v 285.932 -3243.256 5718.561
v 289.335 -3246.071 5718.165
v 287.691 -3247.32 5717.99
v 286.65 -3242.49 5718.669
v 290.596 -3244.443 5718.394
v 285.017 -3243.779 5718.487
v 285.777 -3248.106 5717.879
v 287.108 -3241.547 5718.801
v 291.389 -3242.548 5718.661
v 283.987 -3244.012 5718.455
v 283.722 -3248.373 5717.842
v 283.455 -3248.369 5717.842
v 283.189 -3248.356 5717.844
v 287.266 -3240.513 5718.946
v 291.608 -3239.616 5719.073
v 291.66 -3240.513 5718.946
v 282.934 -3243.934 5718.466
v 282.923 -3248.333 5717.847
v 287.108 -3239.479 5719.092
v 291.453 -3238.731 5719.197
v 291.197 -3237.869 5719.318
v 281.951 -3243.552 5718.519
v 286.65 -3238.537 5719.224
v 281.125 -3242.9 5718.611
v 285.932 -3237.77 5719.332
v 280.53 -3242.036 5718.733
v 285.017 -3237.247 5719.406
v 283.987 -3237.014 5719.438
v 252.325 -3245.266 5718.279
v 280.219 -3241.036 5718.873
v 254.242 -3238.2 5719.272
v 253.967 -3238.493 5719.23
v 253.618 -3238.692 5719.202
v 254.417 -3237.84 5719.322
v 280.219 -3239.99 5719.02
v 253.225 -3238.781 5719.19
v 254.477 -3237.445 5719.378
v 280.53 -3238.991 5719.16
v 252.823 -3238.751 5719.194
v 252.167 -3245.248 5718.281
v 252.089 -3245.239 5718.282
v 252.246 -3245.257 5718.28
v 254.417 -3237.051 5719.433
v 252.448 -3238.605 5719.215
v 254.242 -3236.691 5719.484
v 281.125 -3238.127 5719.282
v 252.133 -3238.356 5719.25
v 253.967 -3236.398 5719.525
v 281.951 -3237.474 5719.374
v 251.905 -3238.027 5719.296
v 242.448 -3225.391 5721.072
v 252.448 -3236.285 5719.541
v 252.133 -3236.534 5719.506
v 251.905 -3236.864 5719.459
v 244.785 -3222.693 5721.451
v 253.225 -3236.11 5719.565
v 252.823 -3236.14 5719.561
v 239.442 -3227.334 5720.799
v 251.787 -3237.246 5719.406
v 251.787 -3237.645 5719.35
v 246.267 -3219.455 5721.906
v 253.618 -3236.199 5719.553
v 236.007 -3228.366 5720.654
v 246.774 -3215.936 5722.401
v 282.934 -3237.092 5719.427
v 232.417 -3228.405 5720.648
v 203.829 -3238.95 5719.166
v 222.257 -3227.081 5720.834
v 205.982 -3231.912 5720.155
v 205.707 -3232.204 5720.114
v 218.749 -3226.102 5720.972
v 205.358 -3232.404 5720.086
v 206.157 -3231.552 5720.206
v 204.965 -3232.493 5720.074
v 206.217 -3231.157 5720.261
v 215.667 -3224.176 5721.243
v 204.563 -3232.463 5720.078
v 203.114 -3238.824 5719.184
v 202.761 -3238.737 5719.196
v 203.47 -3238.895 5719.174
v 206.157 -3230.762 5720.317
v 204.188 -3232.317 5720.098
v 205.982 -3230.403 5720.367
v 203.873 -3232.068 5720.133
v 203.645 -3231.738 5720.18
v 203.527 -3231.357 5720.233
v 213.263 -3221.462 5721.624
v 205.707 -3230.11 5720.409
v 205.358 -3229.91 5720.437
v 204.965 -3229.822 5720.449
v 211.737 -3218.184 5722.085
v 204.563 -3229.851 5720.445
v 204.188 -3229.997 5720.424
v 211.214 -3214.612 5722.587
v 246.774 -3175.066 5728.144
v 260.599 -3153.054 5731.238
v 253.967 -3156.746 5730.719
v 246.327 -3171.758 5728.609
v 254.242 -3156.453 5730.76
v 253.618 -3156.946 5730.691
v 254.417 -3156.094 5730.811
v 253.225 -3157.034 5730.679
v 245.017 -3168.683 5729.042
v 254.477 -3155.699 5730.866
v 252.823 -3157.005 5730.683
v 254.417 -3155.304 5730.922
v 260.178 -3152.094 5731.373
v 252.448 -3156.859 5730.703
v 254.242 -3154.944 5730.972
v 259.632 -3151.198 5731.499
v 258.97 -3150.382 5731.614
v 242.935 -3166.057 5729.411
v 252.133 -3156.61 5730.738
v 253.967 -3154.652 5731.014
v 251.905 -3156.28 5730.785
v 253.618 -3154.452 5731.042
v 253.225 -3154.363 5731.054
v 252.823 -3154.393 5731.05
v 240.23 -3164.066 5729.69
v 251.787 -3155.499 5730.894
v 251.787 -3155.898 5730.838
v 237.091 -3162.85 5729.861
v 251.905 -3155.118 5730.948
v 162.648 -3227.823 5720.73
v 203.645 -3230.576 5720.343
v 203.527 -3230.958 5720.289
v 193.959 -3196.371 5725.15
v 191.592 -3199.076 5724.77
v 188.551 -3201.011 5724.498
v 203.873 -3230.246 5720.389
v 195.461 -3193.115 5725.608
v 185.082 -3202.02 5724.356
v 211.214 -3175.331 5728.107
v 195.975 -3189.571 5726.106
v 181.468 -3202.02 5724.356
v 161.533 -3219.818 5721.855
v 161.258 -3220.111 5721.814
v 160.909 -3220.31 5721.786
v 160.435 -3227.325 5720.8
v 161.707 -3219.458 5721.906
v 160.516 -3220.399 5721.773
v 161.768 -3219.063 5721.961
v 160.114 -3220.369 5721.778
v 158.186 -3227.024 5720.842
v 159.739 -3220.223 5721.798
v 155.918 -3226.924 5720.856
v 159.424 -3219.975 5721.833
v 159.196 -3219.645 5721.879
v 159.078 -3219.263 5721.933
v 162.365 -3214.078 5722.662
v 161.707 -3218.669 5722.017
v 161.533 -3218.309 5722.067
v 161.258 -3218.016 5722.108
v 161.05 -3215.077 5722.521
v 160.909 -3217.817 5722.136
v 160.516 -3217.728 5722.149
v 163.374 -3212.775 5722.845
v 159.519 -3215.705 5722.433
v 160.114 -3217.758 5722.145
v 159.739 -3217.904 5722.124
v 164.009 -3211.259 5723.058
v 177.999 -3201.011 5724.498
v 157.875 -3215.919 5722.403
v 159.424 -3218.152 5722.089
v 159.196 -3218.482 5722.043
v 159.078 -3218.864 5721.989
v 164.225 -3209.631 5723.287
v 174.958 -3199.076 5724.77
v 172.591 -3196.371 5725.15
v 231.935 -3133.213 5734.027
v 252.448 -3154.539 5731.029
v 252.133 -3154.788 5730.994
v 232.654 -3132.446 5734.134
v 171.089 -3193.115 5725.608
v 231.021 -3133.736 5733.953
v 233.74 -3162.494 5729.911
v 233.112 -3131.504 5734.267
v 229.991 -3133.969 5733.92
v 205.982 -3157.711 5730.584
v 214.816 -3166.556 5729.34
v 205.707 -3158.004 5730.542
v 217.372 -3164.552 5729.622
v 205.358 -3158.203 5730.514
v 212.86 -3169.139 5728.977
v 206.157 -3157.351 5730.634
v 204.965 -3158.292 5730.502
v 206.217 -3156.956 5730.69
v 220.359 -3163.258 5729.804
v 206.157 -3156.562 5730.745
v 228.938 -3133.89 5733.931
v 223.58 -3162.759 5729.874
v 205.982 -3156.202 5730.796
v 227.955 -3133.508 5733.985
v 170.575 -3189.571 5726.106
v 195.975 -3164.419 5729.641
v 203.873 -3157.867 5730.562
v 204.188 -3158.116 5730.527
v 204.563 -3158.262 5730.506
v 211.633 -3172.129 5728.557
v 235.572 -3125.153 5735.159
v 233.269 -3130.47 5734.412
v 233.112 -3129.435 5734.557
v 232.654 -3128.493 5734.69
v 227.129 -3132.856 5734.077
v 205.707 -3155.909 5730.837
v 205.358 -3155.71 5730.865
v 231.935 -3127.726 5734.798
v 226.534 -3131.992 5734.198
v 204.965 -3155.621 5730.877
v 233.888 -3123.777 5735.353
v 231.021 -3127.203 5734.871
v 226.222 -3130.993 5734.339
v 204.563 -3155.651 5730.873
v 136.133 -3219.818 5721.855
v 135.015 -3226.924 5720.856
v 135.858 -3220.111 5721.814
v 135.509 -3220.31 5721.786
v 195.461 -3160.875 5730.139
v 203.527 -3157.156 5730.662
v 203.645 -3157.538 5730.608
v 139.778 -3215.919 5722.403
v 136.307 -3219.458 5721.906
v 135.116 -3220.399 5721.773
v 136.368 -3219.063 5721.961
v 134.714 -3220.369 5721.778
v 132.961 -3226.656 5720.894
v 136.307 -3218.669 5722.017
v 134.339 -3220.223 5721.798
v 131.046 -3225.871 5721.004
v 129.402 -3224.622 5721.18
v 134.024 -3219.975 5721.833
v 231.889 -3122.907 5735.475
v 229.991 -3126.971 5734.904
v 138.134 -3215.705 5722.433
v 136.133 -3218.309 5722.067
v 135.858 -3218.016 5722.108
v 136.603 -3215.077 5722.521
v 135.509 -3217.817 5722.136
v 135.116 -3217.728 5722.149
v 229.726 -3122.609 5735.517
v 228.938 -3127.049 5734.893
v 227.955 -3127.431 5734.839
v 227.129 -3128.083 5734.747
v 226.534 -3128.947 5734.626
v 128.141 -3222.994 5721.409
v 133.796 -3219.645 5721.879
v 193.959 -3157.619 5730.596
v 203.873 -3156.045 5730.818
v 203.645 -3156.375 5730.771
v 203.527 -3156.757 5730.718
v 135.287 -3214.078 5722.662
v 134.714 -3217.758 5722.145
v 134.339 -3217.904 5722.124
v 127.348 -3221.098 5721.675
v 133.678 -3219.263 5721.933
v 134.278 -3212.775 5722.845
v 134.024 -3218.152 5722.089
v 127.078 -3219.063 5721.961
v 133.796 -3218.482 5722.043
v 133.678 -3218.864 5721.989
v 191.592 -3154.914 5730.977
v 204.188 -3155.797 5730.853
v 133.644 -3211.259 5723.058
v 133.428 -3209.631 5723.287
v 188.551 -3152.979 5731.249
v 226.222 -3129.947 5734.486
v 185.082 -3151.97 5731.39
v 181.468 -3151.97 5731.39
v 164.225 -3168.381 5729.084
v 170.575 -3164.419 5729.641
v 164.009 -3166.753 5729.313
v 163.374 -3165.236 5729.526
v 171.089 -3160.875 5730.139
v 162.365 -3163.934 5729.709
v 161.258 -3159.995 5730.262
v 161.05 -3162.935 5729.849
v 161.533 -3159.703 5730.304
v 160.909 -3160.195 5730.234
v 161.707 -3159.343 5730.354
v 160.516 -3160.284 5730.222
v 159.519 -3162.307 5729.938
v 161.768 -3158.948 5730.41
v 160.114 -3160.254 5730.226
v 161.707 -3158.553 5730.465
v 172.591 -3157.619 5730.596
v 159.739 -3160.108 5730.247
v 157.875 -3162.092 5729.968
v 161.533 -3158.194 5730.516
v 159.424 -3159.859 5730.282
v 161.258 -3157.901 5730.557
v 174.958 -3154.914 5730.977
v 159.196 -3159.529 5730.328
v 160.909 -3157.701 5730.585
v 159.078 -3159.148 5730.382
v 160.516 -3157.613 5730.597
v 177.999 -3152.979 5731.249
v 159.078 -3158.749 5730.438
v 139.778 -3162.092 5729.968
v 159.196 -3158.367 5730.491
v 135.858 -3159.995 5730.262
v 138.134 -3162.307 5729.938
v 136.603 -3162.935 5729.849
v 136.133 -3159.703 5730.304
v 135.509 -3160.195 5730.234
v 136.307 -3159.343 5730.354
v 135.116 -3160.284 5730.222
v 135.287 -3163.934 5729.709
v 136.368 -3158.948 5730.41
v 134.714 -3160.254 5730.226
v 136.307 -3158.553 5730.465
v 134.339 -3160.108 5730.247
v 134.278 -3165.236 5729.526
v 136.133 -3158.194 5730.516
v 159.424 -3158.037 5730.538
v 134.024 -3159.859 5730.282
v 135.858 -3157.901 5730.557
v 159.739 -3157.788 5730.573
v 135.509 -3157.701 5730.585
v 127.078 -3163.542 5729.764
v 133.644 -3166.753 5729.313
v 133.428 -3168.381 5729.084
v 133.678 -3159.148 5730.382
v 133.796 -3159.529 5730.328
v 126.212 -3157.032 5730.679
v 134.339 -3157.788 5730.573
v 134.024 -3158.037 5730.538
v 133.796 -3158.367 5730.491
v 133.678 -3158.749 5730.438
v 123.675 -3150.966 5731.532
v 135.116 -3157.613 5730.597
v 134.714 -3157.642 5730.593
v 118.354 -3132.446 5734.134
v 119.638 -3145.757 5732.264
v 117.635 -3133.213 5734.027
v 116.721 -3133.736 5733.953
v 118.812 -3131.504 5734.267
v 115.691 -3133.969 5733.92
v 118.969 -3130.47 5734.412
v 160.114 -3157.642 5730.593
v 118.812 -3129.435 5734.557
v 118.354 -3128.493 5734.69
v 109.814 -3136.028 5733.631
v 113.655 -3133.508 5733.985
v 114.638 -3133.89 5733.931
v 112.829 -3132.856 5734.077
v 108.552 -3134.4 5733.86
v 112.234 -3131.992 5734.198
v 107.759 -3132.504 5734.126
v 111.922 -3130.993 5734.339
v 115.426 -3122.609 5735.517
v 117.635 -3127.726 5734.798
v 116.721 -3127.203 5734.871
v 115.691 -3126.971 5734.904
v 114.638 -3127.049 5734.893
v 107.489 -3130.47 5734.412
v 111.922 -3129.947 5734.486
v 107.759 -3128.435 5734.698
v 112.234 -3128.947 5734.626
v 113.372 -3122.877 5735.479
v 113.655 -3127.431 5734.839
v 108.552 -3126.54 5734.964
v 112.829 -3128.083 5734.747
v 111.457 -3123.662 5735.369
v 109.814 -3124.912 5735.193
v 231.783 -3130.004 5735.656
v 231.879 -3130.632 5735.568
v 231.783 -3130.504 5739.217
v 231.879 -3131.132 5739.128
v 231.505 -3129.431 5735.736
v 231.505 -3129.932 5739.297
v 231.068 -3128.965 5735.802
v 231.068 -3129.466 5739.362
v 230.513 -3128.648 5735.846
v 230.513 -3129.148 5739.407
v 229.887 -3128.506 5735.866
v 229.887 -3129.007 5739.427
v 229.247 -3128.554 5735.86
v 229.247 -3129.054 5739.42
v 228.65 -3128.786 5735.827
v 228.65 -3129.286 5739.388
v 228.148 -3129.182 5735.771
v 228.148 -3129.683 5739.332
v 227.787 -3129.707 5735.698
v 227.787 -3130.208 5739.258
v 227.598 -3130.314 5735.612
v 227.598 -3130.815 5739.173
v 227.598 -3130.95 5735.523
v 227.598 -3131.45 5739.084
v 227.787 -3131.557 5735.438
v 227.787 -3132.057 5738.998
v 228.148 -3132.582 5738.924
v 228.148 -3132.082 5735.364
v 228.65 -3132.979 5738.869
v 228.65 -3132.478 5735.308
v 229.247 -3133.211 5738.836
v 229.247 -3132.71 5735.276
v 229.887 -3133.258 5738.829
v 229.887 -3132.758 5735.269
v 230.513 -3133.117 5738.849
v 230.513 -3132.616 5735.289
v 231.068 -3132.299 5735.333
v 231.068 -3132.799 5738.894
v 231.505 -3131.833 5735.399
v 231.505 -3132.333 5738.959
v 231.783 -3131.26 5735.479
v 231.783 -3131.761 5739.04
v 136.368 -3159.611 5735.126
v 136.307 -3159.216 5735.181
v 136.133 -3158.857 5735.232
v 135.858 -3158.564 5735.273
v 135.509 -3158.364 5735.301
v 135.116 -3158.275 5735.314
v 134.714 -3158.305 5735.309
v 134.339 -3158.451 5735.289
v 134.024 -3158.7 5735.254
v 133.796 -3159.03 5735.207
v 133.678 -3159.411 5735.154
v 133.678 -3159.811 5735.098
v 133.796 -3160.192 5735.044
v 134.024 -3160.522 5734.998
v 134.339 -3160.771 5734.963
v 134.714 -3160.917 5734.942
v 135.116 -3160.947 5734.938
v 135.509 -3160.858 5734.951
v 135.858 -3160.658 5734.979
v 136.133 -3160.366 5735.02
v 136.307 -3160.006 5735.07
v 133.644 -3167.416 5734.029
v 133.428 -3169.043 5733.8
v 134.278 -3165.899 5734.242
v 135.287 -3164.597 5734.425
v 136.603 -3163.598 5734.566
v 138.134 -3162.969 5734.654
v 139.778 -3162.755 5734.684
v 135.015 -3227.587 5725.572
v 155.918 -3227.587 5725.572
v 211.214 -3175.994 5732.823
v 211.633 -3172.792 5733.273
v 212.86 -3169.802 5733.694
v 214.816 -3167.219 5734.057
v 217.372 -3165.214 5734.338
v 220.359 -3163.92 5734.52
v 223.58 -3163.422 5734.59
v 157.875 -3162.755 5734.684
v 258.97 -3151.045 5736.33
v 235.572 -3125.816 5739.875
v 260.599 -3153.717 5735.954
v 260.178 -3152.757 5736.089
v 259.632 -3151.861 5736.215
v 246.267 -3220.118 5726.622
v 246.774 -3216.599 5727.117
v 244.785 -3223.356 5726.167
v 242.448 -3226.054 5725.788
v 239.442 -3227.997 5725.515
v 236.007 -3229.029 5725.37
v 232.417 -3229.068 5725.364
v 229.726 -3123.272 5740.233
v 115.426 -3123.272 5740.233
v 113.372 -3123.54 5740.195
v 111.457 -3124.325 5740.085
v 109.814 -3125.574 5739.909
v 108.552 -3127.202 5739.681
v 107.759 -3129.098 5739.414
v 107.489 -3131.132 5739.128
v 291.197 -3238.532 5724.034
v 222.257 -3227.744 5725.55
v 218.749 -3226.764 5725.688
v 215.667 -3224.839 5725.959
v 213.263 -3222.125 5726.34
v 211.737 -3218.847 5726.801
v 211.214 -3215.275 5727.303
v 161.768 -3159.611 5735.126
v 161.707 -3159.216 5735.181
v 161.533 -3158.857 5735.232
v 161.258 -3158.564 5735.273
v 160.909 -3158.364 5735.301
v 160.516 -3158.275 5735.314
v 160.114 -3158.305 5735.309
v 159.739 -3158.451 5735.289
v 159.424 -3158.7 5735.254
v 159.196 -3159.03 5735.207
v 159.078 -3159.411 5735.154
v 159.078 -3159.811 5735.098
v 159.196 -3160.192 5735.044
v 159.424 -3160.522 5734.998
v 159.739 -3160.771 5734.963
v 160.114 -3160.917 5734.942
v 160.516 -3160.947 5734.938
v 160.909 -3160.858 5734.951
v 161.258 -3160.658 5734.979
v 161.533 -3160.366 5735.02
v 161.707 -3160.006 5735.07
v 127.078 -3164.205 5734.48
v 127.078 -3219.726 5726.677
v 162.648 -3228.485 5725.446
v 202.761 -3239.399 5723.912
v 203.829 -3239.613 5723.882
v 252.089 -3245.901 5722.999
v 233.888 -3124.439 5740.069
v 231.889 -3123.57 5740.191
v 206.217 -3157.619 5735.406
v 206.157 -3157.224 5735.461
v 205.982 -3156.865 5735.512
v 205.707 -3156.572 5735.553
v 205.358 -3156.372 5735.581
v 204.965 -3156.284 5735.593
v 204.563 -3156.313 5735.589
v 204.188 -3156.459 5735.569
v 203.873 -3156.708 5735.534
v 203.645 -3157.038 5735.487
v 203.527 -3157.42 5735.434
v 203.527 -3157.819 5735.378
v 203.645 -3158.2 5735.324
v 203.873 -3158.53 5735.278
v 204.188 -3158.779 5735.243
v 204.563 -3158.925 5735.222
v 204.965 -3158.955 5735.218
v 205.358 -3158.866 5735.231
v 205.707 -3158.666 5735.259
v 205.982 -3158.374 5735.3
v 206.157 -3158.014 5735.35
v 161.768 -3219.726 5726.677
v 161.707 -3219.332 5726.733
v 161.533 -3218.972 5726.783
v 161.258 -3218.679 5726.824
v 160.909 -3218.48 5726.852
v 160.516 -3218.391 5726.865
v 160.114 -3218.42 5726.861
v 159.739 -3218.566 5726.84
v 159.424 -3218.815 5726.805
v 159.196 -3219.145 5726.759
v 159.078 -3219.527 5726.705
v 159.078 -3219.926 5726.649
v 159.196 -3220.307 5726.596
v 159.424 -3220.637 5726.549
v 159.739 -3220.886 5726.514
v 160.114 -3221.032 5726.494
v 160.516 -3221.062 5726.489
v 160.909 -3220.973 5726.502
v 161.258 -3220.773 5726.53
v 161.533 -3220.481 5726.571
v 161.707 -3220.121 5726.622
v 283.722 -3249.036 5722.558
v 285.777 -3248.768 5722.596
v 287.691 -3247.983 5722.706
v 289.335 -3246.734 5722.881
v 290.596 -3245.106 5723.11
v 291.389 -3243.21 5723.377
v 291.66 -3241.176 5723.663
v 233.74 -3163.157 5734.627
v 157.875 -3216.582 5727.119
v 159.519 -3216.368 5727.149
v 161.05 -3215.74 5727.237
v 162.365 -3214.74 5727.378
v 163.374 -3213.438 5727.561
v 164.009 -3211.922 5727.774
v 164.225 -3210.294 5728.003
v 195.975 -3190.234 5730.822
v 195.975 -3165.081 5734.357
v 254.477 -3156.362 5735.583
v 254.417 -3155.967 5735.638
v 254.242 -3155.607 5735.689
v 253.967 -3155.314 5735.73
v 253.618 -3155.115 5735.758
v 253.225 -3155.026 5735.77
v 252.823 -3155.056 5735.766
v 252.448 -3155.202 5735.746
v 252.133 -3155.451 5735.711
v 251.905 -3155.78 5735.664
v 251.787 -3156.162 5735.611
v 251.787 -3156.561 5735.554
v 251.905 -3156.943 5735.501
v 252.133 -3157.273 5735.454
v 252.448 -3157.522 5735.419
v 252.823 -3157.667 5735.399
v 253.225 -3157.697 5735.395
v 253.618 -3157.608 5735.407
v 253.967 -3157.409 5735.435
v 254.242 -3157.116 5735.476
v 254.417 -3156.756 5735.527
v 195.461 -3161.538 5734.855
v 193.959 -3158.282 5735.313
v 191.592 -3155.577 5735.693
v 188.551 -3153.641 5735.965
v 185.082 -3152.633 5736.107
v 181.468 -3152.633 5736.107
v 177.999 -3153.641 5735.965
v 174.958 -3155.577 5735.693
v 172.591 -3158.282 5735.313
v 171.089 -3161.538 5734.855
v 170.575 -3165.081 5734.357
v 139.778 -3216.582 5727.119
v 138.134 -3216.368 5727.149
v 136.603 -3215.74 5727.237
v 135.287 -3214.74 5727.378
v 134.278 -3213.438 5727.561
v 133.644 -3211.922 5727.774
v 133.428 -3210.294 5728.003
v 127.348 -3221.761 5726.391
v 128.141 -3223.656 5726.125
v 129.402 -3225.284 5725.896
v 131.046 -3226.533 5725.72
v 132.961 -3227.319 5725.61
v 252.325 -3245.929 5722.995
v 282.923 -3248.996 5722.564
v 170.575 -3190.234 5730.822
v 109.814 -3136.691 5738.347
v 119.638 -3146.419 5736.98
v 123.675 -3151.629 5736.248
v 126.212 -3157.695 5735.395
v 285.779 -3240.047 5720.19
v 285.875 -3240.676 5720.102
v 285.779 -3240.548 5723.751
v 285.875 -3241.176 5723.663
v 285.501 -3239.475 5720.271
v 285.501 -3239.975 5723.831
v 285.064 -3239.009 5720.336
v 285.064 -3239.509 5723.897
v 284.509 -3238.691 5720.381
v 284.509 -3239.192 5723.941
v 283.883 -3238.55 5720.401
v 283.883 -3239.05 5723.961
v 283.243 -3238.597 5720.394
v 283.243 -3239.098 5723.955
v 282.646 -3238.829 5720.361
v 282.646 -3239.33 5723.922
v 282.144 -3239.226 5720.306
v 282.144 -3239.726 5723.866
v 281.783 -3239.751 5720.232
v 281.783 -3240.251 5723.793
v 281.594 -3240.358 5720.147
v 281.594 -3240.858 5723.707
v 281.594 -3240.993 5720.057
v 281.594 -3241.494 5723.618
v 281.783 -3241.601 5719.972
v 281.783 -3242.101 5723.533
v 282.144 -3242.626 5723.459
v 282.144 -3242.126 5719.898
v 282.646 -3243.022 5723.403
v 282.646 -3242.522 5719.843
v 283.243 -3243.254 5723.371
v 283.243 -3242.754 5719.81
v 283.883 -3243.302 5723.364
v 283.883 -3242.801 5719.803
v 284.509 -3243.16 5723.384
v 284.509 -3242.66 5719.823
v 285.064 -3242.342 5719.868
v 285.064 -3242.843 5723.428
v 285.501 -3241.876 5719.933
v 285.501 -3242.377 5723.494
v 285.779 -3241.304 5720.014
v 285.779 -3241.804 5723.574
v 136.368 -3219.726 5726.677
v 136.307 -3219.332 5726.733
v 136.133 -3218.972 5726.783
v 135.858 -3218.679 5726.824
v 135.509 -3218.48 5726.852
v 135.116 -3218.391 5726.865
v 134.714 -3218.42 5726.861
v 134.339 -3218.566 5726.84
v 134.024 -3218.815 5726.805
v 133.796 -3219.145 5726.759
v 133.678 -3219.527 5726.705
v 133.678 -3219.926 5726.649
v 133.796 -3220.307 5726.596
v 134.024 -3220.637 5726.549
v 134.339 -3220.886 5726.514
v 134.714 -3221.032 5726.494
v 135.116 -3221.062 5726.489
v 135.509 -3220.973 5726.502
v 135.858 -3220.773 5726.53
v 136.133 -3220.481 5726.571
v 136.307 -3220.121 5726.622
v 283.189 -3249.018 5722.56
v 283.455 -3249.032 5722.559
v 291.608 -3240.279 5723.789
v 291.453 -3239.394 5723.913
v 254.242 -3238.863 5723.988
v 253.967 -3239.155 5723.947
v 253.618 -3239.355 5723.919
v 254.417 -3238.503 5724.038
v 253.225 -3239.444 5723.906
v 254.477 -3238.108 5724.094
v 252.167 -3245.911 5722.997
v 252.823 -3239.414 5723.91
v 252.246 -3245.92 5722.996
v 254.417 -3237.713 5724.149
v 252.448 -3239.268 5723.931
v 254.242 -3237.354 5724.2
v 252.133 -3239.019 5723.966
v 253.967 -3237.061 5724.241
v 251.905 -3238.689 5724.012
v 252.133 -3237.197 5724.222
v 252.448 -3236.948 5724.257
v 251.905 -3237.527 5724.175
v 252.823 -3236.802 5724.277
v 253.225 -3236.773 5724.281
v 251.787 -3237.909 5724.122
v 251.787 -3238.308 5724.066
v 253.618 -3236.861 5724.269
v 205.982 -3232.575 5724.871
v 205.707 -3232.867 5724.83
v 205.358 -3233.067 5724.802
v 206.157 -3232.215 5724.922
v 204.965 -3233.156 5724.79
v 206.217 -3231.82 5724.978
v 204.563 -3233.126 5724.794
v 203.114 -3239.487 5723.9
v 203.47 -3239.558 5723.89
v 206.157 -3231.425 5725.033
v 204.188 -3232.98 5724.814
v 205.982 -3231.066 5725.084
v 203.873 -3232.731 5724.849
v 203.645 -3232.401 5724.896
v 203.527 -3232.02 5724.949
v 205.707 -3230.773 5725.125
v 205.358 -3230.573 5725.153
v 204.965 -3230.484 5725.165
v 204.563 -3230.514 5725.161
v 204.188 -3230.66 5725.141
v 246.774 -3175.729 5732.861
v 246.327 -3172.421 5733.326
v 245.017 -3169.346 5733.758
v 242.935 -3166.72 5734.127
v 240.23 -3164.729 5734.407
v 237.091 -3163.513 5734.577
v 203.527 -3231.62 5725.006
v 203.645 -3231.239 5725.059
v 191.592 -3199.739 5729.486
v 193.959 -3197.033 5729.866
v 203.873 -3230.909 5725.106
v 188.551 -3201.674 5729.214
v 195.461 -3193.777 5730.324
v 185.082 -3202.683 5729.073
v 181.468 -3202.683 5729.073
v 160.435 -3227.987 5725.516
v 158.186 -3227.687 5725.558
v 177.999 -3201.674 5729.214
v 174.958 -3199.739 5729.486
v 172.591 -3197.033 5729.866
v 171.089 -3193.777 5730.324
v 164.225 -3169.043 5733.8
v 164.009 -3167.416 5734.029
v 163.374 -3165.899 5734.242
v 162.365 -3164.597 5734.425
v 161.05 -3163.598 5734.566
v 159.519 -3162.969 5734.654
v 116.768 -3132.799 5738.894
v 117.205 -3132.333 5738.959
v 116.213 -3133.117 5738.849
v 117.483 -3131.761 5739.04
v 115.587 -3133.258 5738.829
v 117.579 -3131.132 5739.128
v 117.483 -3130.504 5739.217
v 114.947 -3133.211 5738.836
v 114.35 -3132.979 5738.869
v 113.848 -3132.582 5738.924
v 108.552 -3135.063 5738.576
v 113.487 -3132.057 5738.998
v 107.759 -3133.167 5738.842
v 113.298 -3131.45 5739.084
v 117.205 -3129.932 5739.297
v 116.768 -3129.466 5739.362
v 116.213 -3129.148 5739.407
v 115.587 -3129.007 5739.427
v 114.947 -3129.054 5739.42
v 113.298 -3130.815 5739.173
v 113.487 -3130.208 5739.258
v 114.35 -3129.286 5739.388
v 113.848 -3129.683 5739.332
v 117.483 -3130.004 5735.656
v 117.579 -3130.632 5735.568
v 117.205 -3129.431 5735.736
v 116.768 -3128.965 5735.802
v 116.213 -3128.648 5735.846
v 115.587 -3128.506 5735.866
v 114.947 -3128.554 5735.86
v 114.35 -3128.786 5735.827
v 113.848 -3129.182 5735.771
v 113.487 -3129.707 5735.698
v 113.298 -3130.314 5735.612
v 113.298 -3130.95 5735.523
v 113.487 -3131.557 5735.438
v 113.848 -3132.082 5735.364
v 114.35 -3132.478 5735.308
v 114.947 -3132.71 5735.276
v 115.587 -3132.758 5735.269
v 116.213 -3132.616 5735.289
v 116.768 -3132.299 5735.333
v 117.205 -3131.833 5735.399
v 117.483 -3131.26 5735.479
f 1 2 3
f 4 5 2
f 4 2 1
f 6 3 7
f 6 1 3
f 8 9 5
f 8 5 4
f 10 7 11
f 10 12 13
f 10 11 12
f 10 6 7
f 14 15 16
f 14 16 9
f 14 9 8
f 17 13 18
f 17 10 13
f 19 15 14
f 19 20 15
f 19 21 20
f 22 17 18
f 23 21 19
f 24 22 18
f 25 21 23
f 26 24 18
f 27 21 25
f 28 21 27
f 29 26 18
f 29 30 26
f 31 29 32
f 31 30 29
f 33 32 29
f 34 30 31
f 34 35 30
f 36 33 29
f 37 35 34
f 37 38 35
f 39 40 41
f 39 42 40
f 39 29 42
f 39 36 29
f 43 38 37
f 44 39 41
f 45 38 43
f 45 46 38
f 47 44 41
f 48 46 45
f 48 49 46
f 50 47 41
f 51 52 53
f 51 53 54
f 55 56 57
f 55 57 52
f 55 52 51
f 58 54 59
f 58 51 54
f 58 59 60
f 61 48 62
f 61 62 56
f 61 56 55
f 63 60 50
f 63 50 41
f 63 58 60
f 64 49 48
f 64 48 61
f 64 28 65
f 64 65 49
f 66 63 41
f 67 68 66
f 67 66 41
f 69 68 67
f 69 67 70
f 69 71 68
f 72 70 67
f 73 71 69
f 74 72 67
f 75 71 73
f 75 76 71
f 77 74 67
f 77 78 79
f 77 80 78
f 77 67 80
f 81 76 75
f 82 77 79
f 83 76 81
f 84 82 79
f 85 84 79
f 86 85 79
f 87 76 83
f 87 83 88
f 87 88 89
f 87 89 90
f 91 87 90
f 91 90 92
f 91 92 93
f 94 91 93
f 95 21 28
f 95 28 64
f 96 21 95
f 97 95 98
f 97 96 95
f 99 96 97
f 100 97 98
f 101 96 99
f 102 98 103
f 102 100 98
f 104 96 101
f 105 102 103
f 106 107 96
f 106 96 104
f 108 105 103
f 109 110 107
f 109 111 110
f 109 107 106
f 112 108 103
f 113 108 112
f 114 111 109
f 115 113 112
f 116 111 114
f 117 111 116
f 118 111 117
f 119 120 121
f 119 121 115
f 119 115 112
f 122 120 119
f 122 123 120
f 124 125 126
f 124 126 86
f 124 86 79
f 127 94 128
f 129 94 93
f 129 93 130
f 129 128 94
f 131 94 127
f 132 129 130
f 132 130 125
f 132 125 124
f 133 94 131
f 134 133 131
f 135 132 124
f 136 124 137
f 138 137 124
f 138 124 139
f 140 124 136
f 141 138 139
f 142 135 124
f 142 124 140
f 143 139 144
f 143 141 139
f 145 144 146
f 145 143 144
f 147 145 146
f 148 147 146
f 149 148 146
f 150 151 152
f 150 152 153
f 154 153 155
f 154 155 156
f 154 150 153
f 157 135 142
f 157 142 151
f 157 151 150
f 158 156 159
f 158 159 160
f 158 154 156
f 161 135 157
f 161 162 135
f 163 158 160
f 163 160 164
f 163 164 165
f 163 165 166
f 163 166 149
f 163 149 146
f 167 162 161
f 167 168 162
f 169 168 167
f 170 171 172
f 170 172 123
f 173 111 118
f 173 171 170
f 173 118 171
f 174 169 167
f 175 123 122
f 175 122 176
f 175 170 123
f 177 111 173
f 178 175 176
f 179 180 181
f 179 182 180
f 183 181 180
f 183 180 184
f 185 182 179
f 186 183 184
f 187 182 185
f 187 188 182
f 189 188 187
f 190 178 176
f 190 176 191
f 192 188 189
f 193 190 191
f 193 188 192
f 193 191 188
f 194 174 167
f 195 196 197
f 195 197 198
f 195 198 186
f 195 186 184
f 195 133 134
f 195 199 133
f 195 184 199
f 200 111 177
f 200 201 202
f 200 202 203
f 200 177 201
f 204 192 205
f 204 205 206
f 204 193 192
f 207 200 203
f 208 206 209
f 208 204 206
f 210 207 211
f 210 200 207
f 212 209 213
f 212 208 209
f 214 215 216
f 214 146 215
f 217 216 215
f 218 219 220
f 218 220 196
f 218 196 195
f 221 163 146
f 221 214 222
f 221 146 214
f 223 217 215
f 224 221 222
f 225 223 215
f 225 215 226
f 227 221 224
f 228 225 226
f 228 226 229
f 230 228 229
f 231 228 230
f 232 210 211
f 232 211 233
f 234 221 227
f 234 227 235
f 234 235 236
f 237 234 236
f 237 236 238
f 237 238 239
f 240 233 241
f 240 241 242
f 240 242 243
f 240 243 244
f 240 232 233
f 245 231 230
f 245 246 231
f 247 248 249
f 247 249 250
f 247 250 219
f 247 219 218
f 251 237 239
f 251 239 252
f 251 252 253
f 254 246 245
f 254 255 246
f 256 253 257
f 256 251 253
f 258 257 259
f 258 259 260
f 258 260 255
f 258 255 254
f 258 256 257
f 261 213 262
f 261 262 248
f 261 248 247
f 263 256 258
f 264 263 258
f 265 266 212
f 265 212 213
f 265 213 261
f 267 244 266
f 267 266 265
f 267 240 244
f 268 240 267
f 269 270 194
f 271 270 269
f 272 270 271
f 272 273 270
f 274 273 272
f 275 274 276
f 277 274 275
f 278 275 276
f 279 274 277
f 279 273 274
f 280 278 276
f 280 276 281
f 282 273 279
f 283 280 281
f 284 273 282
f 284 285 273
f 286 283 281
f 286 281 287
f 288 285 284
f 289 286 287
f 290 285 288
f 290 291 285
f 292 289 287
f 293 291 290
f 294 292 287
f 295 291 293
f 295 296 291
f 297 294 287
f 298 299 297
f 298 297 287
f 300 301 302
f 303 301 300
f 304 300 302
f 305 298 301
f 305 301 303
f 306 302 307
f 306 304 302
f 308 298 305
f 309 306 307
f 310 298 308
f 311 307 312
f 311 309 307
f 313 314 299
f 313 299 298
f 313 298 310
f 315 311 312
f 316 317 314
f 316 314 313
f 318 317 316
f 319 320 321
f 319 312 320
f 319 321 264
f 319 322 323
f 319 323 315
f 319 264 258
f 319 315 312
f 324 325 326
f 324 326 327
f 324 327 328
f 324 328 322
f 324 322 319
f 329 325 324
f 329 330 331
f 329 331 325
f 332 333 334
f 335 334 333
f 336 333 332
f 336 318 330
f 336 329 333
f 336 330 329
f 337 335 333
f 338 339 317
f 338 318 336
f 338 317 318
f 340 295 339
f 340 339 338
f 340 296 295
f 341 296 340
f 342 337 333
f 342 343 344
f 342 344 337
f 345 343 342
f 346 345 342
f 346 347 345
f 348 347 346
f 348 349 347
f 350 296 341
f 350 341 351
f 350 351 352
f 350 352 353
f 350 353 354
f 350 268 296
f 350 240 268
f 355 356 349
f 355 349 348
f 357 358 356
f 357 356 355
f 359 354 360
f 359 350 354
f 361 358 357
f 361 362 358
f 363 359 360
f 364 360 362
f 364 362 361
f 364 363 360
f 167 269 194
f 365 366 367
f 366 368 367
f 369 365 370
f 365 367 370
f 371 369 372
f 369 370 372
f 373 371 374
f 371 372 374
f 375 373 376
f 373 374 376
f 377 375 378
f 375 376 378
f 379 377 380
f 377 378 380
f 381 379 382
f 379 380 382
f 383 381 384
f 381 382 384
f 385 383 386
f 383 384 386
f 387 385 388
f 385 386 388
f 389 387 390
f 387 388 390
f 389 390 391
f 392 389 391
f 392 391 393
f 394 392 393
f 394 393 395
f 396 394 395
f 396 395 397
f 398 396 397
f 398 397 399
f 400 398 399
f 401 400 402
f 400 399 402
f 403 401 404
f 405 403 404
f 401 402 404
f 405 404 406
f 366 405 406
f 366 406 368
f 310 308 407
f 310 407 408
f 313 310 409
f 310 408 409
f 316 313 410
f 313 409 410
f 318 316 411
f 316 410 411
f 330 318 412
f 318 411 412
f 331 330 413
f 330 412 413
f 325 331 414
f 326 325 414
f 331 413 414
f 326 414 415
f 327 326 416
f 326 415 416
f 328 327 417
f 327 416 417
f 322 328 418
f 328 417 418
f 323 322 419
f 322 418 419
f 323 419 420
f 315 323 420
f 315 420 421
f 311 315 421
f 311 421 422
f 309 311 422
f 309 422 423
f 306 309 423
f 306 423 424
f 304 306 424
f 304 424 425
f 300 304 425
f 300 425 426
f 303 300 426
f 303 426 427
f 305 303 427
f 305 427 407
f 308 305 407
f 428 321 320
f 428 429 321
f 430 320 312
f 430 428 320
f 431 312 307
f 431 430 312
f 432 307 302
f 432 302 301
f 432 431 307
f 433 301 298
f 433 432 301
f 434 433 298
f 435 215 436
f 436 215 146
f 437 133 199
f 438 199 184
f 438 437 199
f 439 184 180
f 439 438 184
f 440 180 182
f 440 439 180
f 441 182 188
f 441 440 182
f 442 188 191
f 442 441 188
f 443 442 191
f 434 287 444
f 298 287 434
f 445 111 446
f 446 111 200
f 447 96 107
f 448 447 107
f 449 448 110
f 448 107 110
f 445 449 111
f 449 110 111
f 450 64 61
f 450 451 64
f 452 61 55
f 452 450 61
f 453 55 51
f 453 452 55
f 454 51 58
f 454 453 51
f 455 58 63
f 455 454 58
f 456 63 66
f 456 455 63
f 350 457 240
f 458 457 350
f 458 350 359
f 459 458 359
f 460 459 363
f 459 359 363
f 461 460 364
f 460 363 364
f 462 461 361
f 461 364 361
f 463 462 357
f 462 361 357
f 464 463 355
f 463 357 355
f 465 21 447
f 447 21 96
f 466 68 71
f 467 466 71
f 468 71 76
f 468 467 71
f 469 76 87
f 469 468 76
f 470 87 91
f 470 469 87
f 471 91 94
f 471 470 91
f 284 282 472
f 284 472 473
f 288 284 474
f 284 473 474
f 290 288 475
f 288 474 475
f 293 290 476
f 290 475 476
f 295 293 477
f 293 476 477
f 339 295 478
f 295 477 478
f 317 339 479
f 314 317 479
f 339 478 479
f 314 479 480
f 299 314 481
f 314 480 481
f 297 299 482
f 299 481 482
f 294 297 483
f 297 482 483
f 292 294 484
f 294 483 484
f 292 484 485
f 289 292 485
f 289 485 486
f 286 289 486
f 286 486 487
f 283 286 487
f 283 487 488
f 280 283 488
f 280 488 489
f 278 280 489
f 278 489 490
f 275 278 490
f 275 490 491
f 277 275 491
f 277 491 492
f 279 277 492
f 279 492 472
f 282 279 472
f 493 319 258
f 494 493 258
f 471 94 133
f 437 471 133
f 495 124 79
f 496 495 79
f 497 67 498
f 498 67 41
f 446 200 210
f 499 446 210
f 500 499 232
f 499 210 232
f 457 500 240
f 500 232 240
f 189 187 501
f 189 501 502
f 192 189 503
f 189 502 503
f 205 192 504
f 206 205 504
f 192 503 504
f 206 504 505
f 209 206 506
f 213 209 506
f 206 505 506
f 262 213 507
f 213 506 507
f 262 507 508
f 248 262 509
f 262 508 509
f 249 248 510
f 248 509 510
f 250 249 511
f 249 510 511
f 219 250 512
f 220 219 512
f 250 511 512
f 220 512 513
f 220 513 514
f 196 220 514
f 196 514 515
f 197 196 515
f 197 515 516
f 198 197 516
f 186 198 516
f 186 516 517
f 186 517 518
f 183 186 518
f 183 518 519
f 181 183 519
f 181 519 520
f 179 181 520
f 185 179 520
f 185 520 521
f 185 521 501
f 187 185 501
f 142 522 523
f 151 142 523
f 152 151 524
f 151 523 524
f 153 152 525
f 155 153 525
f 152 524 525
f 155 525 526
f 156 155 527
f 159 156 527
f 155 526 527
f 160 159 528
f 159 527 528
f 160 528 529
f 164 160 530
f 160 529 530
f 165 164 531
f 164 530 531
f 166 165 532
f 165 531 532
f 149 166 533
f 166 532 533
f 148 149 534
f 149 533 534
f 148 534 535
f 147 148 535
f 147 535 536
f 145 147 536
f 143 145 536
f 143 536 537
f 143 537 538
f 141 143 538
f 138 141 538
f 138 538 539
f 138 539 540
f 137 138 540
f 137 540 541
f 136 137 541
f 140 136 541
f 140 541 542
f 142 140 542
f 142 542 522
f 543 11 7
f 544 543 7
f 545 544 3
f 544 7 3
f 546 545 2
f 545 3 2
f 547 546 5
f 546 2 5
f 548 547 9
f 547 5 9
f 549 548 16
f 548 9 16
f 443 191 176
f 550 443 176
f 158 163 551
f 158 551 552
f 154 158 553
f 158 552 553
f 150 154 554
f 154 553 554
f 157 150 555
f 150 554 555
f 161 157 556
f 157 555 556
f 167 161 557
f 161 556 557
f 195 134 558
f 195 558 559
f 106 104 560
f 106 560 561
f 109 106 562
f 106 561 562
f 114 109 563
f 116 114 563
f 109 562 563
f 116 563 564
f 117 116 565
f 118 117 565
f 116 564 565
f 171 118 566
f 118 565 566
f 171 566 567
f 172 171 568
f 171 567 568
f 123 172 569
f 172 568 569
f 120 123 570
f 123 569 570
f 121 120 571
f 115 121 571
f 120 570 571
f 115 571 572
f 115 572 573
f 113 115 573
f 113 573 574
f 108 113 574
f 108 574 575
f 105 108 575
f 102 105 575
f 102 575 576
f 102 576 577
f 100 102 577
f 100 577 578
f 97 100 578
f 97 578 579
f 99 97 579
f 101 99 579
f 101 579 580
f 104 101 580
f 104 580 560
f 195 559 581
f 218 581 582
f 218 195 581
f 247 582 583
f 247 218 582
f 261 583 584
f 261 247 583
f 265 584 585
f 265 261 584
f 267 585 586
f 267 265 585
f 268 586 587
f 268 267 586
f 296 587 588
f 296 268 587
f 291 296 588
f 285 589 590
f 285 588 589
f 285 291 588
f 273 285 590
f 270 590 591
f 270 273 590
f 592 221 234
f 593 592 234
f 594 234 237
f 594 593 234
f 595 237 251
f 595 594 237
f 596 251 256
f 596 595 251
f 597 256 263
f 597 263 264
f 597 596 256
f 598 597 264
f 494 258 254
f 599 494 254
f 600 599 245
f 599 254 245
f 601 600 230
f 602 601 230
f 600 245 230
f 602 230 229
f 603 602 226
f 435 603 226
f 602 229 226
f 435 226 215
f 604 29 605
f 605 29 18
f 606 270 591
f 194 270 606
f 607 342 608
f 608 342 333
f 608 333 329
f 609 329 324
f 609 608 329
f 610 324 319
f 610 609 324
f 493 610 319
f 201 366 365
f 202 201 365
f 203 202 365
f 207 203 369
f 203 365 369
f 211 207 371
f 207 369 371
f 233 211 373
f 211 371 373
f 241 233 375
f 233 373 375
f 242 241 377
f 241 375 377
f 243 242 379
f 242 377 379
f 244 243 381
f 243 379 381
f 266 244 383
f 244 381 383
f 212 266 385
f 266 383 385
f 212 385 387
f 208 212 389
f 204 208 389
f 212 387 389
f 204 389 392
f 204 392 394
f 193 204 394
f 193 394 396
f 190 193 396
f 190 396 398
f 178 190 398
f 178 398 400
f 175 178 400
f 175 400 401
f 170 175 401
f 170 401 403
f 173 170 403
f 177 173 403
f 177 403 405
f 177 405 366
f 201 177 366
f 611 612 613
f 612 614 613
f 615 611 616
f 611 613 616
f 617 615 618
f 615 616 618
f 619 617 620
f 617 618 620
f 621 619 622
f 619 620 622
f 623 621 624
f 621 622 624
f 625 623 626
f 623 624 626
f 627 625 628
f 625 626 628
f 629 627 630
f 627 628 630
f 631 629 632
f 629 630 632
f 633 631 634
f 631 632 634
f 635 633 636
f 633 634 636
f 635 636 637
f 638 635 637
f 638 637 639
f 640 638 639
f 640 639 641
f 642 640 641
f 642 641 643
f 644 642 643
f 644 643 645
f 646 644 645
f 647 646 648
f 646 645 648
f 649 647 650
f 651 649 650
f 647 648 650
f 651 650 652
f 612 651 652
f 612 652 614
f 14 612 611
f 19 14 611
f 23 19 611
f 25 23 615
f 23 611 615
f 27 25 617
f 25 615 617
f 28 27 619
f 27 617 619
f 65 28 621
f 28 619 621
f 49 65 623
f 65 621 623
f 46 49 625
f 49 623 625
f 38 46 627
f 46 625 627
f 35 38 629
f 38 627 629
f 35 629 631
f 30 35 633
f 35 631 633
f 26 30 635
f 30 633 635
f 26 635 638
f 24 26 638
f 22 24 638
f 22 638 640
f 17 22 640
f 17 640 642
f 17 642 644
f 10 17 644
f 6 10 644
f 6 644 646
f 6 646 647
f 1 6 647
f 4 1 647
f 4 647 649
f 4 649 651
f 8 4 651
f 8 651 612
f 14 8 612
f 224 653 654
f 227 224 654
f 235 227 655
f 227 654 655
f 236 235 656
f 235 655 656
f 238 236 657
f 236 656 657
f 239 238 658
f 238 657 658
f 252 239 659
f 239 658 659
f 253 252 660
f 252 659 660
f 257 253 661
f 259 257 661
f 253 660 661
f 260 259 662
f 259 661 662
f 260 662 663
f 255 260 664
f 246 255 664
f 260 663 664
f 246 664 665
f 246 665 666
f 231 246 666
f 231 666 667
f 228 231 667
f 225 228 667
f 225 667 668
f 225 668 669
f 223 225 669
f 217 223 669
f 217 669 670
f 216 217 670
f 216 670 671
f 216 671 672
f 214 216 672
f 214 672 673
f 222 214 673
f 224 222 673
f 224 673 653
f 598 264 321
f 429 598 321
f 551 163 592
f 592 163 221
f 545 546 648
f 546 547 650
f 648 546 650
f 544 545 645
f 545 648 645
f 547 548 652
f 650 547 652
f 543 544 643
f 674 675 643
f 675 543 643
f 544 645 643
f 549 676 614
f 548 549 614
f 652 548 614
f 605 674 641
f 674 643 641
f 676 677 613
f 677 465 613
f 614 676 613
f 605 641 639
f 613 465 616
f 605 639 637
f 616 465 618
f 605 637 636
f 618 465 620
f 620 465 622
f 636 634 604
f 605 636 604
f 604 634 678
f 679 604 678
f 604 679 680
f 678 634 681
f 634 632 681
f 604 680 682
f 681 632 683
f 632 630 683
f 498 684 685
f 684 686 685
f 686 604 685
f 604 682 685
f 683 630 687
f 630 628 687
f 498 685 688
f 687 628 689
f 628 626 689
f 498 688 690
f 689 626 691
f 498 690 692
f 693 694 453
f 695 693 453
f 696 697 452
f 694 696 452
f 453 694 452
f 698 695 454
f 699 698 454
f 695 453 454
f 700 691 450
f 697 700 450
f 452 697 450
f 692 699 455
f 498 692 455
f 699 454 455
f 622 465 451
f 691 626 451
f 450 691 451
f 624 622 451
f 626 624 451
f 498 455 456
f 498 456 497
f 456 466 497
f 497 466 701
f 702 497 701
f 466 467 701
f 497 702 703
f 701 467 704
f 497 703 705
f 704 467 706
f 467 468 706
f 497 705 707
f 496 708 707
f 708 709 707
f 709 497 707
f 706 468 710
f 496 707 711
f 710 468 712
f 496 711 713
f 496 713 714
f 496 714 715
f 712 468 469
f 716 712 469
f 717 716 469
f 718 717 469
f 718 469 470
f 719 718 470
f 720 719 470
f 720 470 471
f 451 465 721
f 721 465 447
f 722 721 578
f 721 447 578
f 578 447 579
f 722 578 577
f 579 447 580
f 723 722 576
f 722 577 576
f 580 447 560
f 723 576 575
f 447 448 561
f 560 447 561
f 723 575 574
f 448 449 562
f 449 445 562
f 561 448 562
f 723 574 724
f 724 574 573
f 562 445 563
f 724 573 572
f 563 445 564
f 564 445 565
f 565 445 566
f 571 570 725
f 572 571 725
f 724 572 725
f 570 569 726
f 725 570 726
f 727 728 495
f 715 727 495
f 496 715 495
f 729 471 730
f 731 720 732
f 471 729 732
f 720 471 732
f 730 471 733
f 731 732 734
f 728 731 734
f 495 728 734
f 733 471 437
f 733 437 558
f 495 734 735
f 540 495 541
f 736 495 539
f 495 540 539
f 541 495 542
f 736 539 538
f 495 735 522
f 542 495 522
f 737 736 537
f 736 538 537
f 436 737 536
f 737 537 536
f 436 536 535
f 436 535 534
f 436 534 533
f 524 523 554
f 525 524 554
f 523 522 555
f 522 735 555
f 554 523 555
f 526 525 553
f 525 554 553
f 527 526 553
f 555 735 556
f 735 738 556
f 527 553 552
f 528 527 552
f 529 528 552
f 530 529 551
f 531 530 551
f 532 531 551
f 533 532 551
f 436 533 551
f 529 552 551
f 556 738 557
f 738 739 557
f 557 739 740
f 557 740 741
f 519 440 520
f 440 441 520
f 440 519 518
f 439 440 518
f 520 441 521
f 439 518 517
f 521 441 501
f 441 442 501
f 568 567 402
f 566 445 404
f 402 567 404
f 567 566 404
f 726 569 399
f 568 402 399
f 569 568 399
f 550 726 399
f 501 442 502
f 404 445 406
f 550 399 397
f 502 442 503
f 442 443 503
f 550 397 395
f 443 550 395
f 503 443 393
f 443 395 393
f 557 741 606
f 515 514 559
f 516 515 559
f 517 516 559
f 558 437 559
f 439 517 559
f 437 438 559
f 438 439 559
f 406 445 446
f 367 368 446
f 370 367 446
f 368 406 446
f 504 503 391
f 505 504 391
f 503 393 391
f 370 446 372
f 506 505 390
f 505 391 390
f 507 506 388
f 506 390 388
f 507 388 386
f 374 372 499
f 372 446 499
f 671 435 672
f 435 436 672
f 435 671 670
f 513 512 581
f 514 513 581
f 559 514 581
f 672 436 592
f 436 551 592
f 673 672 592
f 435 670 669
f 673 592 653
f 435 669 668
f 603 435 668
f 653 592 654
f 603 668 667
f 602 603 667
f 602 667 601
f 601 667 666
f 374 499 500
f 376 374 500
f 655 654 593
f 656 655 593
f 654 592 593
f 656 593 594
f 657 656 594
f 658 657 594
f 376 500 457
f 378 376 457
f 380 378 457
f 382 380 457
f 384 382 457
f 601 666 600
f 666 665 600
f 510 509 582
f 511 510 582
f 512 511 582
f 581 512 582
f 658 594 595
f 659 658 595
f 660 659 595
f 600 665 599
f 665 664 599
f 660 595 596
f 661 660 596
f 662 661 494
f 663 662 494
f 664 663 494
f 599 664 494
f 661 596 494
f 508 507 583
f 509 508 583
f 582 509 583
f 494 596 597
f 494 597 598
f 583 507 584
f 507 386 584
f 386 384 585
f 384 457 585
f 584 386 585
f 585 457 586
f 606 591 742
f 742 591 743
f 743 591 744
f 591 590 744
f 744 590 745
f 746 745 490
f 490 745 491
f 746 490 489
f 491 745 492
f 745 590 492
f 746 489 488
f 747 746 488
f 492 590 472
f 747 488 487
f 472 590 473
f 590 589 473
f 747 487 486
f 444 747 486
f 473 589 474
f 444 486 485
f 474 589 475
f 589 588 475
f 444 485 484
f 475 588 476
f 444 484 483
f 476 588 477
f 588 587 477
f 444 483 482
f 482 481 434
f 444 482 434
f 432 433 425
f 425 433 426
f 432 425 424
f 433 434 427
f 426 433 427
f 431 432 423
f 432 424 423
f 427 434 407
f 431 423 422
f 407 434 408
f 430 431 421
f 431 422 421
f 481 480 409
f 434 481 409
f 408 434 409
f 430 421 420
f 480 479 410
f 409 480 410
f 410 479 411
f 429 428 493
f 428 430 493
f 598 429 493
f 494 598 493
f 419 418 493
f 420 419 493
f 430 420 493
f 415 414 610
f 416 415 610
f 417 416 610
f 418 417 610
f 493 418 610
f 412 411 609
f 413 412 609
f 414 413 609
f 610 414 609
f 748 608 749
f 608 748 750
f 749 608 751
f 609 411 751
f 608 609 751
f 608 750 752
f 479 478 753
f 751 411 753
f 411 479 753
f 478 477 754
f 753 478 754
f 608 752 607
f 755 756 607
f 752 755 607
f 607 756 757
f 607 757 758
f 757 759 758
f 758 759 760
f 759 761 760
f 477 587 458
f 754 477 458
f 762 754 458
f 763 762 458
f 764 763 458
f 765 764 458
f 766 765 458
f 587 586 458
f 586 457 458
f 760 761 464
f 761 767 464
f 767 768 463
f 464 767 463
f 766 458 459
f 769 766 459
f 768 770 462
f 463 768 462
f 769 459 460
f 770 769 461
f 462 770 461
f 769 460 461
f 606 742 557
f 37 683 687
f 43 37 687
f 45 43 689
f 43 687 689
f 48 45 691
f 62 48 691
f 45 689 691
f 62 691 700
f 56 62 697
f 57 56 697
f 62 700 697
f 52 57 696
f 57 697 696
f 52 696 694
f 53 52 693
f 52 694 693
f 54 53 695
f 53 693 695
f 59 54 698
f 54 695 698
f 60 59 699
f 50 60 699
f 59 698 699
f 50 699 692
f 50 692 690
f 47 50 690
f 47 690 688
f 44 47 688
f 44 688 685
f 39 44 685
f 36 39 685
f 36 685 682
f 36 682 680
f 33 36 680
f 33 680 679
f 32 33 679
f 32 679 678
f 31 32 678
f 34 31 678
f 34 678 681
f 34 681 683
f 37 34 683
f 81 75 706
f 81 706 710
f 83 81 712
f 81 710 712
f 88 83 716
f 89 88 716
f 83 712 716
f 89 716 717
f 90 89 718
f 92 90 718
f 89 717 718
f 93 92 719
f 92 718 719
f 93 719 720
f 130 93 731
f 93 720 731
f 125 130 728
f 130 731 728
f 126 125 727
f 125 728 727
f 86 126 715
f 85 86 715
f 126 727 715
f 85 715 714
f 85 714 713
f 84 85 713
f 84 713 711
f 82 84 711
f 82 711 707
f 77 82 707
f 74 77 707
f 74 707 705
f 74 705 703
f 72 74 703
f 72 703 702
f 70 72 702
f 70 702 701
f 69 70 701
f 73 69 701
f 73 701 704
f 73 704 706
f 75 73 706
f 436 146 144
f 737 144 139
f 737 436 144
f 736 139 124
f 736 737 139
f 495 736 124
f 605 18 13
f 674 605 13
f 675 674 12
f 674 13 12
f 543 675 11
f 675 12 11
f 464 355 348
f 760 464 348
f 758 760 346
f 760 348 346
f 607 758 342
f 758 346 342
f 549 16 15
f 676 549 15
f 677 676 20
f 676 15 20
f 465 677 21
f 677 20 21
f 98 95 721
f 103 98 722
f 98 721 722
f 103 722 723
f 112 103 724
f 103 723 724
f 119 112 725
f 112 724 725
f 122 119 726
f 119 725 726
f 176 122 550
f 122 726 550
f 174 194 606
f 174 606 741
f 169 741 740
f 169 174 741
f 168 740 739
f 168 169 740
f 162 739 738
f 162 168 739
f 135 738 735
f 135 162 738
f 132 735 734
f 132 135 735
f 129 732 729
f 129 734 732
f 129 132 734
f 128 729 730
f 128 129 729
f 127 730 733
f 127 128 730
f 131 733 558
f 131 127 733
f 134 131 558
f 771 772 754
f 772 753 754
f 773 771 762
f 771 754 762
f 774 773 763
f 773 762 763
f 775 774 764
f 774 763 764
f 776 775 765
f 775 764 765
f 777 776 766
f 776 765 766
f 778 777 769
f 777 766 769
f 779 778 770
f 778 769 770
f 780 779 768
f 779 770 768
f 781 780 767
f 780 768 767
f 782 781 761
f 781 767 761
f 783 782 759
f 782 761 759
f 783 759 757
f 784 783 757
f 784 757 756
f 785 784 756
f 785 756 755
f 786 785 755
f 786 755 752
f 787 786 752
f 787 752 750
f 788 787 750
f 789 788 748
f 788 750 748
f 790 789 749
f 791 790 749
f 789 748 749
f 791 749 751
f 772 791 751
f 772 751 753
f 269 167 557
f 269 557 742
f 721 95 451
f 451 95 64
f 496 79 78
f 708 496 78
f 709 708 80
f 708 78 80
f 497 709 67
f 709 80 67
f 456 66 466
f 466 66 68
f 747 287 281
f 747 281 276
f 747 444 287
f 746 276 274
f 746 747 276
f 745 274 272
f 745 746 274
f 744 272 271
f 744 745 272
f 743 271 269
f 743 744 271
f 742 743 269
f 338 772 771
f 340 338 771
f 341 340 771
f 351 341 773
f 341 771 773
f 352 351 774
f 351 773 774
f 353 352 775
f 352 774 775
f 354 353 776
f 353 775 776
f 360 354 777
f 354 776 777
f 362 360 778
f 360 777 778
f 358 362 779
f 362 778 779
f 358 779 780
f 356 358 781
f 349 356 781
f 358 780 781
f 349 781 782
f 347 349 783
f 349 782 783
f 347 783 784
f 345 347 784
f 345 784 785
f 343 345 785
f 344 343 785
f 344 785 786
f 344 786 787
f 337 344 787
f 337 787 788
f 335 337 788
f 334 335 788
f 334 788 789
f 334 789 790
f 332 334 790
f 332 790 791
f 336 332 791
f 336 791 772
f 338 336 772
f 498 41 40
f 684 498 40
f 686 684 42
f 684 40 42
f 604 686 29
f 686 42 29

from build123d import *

# Parameters (mm, degrees)
SKETCH2_W                                         = 184.171135827
SKETCH2_H                                         = 127
BOSS_EXTRUDE1_DEPTH                               = 4.7625
CSK_FOR_6_FLAT_HEAD_MACHINE_SCREW_100_D           = 4.3053
CSK_FOR_6_FLAT_HEAD_MACHINE_SCREW_100_CSINK_D     = 7.0866
CSK_FOR_6_FLAT_HEAD_MACHINE_SCREW_100_CSINK_ANGLE = 100
CUT_EXTRUDE1_DEPTH                                = 2440.147405433
F_2_CLEARANCE_HOLE1_D                             = 2.7051
CUT_EXTRUDE2_DEPTH                                = 4.7625
FILLET1_R                                         = 25.4
SKETCH10_W                                        = 30.7975
SKETCH10_H                                        = 54.356
CUT_EXTRUDE3_DEPTH                                = 2440.147405433
FILLET2_R                                         = 6.35
CUT_EXTRUDE4_DEPTH                                = 2440.147405433
FILLET3_R                                         = 12.7


with BuildPart() as part:
    # Sketch2 → Boss-Extrude1 (new body)
    with BuildSketch(Plane(origin=(-1e-09, -851.606445574, 6059.494718221), x_dir=(-1, 0, 0), z_dir=(1.0892556339675399e-13, 0.13917310096006327, -0.9902680687415707))):
        with Locations((-199.574242123, -2357.490725166)):
            Rectangle(SKETCH2_W, SKETCH2_H)
    extrude(amount=BOSS_EXTRUDE1_DEPTH)

    # CSK for #6 Flat Head Machine Screw (100)1 (through all)
    with Locations(Plane(origin=(-1e-09, -850.94363368, 6054.778566544), x_dir=(-1, 0, 0), z_dir=(1.0707755897952407e-13, 0.13917310096005847, -0.9902680687415714))):
        with Locations((-115.42617421, -2301.928225166), (-229.72617421, -2301.928225166), (-283.722310037, -2413.053225166)):
            CounterSinkHole(CSK_FOR_6_FLAT_HEAD_MACHINE_SCREW_100_D / 2, CSK_FOR_6_FLAT_HEAD_MACHINE_SCREW_100_CSINK_D / 2, counter_sink_angle=CSK_FOR_6_FLAT_HEAD_MACHINE_SCREW_100_CSINK_ANGLE)

    # Sketch5 → Cut-Extrude1 (cut, through all)
    with BuildSketch(Plane(origin=(-1e-09, -850.94363368, 6054.778566544), x_dir=(-1, 0, 0), z_dir=(1.0707755897952407e-13, 0.13917310096005847, -0.9902680687415714))):
        with BuildLine():
            Line((-195.975000021, -2361.610724808), (-195.975000021, -2336.210724808))
            ThreePointArc((-195.975000021, -2336.210724808), (-183.275000021, -2323.510724808), (-170.575000021, -2336.210724808))
            Line((-170.575000021, -2336.210724808), (-170.575000021, -2361.610724808))
            ThreePointArc((-170.575000021, -2361.610724808), (-183.275000021, -2374.310724808), (-195.975000021, -2361.610724808))
        make_face()
    extrude(amount=-CUT_EXTRUDE1_DEPTH, mode=Mode.SUBTRACT)

    # #2 Clearance Hole1 (through all)
    with Locations(Plane(origin=(-1e-09, -850.94363368, 6054.778566544), x_dir=(-1, 0, 0), z_dir=(1.0707755897952407e-13, 0.13917310096005847, -0.9902680687415714))):
        with Locations((-135.015000021, -2391.392725166), (-160.415000021, -2391.392725166), (-160.415000021, -2330.686725166), (-135.015000021, -2330.686725166), (-204.864100021, -2328.675325166), (-204.864100021, -2403.605325166), (-253.124100021, -2409.955325166), (-253.124100021, -2327.405325166)):
            Hole(F_2_CLEARANCE_HOLE1_D / 2)

    # Sketch9 → Cut-Extrude2 (cut)
    with BuildSketch(Plane(origin=(-1e-09, -850.94363368, 6054.778566544), x_dir=(-1, 0, 0), z_dir=(1.0707755897952407e-13, 0.13917310096005847, -0.9902680687415714))):
        with BuildLine():
            Line((-252.324559302, -2417.852453814), (-282.922769318, -2420.950353814))
            ThreePointArc((-282.922769318, -2420.950353814), (-283.322030383, -2420.980625903), (-283.722310037, -2420.990725166))
            Line((-283.722310037, -2420.990725166), (-107.48867421, -2420.990725166))
            Line((-107.48867421, -2420.990725166), (-107.48867421, -2301.928225166))
            ThreePointArc((-107.48867421, -2301.928225166), (-108.092880421, -2304.96577491), (-109.813514134, -2307.540885241))
            Line((-109.813514134, -2307.540885241), (-127.077500021, -2324.804871128))
            Line((-127.077500021, -2324.804871128), (-127.077500021, -2391.392725166))
            ThreePointArc((-127.077500021, -2391.392725166), (-129.402339945, -2397.005385241), (-135.015000021, -2399.330225166))
            Line((-135.015000021, -2399.330225166), (-159.344404514, -2399.330225166))
            Line((-159.344404514, -2399.330225166), (-202.761165842, -2411.259185244))
            ThreePointArc((-202.761165842, -2411.259185244), (-203.291186027, -2411.385418213), (-203.828617327, -2411.474993637))
            Line((-203.828617327, -2411.474993637), (-252.088617327, -2417.824993637))
            ThreePointArc((-252.088617327, -2417.824993637), (-252.206485588, -2417.839606363), (-252.324559302, -2417.852453814))
        make_face()
        with BuildLine():
            Line((-291.659810037, -2293.990725166), (-291.659810037, -2413.053225166))
            ThreePointArc((-291.659810037, -2413.053225166), (-291.543281919, -2411.69812182), (-291.197118994, -2410.382806226))
            Line((-291.197118994, -2410.382806226), (-260.598908977, -2324.734906226))
            ThreePointArc((-260.598908977, -2324.734906226), (-259.919874258, -2323.303940185), (-258.970238667, -2322.036287154))
            Line((-258.970238667, -2322.036287154), (-235.572312857, -2296.559187154))
            ThreePointArc((-235.572312857, -2296.559187154), (-232.918913397, -2294.661154041), (-229.72617421, -2293.990725166))
            Line((-229.72617421, -2293.990725166), (-291.659810037, -2293.990725166))
        make_face()
        with BuildLine():
            ThreePointArc((-115.42617421, -2293.990725166), (-109.813514134, -2296.31556509), (-107.48867421, -2301.928225166))
            Line((-107.48867421, -2301.928225166), (-107.48867421, -2293.990725166))
            Line((-107.48867421, -2293.990725166), (-115.42617421, -2293.990725166))
        make_face()
        with BuildLine():
            Line((-291.659810037, -2420.990725166), (-283.722310037, -2420.990725166))
            ThreePointArc((-283.722310037, -2420.990725166), (-289.334970113, -2418.665885241), (-291.659810037, -2413.053225166))
            Line((-291.659810037, -2413.053225166), (-291.659810037, -2420.990725166))
        make_face()
    extrude(amount=-CUT_EXTRUDE2_DEPTH, mode=Mode.SUBTRACT)

    # Fillet1
    fillet1_edges = [part.edges().sort_by_distance(p)[0] for p in [
        (127.07750002, -3153.45506956, 5733.586339341),
        (159.344404514, -3227.255147975, 5723.214414719),
    ]]
    fillet(fillet1_edges, radius=FILLET1_R)

    # Sketch10 → Cut-Extrude3 (cut, through all)
    with BuildSketch(Plane(origin=(-1e-09, -850.94363368, 6054.778566544), x_dir=(-1, 0, 0), z_dir=(1.0707755897952407e-13, 0.13917310096005847, -0.9902680687415714))):
        with Locations((-148.826250021, -2361.039725166)):
            Rectangle(SKETCH10_W, SKETCH10_H)
    extrude(amount=-CUT_EXTRUDE3_DEPTH, mode=Mode.SUBTRACT)

    # Fillet2
    fillet2_edges = [part.edges().sort_by_distance(p)[0] for p in [
        (133.42750002, -3162.423782917, 5732.325868879),
        (133.42750002, -3216.250794061, 5724.760975804),
        (164.22500002, -3216.250794061, 5724.760975804),
        (164.22500002, -3162.423782917, 5732.325868879),
    ]]
    fillet(fillet2_edges, radius=FILLET2_R)

    # Sketch11 → Cut-Extrude4 (cut, through all)
    with BuildSketch(Plane(origin=(-1e-09, -850.94363368, 6054.778566544), x_dir=(-1, 0, 0), z_dir=(1.0707755897952407e-13, 0.13917310096005847, -0.9902680687415714))):
        Polygon((-246.774100021, -2333.924628802), (-246.774100021, -2402.715065895), (-211.214100021, -2398.036118527), (-211.214100021, -2334.860418276), align=None)
    extrude(amount=-CUT_EXTRUDE4_DEPTH, mode=Mode.SUBTRACT)

    # Fillet3
    fillet3_edges = [part.edges().sort_by_distance(p)[0] for p in [
        (246.77410002, -3162.486074379, 5732.317114385),
        (211.21410002, -3163.412756814, 5732.186877662),
        (211.21410002, -3225.973635493, 5723.394519553),
        (246.77410002, -3230.607047667, 5722.743335939),
    ]]
    fillet(fillet3_edges, radius=FILLET3_R)


solid = part.part
